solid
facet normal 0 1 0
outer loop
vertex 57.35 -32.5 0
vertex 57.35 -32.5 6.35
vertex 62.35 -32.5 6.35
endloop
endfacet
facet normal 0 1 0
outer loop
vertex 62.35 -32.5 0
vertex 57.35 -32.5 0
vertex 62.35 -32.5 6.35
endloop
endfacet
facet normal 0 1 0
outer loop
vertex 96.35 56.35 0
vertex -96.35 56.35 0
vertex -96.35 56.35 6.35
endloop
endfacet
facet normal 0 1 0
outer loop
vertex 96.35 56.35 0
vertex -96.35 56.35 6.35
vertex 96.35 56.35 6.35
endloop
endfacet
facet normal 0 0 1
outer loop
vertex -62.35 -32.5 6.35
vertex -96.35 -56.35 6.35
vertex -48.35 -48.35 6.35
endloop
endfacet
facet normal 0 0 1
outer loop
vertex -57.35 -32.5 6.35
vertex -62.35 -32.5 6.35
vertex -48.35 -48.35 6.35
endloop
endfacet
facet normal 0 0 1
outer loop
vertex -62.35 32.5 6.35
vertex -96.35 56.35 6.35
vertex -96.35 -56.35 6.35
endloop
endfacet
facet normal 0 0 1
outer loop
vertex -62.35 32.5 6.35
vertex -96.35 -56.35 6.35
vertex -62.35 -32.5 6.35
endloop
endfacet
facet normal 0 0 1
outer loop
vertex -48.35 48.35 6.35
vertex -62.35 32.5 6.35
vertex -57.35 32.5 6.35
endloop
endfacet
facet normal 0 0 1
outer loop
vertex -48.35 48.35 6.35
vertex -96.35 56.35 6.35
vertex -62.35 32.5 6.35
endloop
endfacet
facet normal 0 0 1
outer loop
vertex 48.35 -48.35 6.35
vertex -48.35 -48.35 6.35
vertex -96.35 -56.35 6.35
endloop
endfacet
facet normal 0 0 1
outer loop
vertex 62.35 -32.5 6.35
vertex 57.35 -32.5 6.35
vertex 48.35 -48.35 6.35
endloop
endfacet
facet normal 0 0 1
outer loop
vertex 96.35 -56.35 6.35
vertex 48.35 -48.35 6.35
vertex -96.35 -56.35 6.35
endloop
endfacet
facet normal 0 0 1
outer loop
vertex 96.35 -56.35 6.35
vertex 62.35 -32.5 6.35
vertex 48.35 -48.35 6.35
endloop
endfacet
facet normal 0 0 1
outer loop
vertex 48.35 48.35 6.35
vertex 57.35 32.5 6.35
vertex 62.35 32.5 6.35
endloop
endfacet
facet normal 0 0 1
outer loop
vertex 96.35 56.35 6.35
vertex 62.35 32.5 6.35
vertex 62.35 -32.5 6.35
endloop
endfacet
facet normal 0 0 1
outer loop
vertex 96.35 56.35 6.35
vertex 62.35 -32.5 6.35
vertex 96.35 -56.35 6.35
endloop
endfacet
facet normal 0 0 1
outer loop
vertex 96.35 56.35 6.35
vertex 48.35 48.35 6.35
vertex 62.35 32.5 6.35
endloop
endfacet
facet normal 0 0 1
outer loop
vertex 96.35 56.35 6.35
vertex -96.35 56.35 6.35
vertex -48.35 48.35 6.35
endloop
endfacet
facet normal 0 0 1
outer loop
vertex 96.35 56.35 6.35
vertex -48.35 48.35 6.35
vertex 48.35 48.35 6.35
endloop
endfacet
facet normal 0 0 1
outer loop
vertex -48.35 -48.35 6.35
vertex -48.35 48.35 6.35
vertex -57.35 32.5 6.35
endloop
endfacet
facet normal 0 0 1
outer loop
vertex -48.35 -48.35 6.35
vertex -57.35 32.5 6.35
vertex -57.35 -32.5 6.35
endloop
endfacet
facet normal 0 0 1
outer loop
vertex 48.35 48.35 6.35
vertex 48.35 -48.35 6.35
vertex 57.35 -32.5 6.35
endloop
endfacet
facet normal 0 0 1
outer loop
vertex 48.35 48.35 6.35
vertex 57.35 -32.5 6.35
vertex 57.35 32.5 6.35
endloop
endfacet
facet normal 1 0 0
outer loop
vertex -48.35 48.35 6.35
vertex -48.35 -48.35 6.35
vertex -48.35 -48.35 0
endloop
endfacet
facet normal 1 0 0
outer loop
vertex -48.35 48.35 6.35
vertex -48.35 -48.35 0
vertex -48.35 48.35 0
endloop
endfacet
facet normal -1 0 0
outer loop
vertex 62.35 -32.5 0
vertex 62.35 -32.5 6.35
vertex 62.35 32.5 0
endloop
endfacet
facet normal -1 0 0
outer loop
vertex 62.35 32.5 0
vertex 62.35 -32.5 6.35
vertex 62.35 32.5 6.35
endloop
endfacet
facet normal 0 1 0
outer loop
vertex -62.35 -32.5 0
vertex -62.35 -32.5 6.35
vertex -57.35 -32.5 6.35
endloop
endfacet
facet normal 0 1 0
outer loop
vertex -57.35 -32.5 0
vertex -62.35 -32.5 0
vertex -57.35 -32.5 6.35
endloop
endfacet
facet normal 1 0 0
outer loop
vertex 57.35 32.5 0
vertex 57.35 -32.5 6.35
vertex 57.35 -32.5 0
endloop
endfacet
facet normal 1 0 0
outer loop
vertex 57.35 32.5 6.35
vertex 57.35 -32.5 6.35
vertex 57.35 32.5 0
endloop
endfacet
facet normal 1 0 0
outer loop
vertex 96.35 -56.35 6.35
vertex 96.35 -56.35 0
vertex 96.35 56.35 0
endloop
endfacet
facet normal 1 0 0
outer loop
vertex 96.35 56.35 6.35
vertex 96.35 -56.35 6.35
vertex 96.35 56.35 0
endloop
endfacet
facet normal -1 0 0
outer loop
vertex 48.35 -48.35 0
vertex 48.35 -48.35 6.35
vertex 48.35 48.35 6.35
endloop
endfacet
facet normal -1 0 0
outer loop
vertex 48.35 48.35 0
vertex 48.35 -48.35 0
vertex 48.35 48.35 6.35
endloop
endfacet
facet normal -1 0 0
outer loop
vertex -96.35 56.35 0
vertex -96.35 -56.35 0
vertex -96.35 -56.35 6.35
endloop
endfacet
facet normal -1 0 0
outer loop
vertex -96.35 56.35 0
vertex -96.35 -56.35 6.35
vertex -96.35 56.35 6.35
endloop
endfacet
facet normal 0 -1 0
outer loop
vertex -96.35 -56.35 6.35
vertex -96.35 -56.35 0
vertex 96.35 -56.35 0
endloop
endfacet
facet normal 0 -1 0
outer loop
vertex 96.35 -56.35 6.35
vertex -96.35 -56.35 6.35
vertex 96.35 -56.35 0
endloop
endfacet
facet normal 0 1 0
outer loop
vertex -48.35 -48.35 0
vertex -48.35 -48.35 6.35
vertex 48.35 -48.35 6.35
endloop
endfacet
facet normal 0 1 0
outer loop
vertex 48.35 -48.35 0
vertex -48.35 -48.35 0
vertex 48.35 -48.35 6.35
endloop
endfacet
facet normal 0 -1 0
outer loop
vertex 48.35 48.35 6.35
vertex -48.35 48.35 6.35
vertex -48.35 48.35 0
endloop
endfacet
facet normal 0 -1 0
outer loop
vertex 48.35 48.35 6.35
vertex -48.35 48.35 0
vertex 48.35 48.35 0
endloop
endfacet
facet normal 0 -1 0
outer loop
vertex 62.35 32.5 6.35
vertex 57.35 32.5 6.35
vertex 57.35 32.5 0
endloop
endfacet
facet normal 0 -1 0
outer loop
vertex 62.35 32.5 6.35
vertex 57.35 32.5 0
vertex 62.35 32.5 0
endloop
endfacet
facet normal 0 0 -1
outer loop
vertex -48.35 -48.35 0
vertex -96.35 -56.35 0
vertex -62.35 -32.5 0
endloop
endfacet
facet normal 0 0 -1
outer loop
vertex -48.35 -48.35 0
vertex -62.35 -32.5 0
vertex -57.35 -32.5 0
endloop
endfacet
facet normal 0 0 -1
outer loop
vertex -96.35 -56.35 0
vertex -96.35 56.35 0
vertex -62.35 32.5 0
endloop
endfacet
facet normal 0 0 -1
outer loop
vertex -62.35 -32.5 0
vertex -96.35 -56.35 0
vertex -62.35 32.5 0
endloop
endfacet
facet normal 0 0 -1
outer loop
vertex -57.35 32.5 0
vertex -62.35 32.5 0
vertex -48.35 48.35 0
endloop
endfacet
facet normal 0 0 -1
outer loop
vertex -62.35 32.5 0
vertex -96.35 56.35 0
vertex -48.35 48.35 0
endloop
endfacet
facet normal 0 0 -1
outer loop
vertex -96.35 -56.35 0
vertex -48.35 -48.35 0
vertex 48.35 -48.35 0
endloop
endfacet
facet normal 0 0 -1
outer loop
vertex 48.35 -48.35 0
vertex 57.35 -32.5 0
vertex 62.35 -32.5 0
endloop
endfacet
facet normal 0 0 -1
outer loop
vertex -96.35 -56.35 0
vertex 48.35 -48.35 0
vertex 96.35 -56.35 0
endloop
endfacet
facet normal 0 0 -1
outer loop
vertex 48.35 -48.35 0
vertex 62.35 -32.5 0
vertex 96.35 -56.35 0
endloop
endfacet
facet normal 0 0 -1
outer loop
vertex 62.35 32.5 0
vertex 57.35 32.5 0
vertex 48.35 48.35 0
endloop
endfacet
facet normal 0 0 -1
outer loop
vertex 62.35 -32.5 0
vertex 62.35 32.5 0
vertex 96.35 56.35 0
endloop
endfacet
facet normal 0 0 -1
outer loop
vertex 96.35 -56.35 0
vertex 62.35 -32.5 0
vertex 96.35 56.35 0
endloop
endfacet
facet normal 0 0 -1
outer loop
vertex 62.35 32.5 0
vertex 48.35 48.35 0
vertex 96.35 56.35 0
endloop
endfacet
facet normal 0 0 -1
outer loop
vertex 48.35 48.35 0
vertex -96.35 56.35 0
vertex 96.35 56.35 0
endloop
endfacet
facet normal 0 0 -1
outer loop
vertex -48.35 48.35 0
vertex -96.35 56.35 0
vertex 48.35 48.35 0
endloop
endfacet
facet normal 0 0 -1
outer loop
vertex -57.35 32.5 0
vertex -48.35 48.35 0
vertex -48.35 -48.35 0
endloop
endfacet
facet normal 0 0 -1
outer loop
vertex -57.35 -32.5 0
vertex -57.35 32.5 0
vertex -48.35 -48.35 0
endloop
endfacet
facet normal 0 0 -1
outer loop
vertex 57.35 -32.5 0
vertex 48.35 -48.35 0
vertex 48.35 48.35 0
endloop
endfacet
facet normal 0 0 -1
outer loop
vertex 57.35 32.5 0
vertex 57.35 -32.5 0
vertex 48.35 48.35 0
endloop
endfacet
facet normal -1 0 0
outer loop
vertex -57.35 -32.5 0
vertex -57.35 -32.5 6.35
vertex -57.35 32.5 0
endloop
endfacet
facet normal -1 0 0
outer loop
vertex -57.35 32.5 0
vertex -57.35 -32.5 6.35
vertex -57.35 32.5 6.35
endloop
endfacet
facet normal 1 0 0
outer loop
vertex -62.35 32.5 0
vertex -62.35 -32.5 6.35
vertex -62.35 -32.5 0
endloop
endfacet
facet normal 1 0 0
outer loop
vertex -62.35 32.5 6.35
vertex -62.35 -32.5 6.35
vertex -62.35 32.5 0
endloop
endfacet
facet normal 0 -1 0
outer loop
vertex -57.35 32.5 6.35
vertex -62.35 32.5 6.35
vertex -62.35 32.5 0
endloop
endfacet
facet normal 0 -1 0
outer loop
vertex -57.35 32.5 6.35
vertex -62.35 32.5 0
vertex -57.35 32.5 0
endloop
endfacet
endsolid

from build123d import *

# Parameters (mm, degrees)
F0_W     = 192.7
F0_H     = 112.7
F1_DEPTH = 6.35
F2_W     = 96.7
F2_H     = 96.7
F2_W_2   = 5
F2_H_2   = 65
F3_DEPTH = 6.351


with BuildPart() as f1:
    # F0 (on Top) → F1 (new body)
    with BuildSketch(Plane.XY):
        Rectangle(F0_W, F0_H)
    extrude(amount=F1_DEPTH)

    # F2 (on face) → F3 (cut, through all)
    with BuildSketch(Plane.XY.offset(6.35)):
        Rectangle(F2_W, F2_H)
        with Locations((-59.85, 0)):
            Rectangle(F2_W_2, F2_H_2)
        with Locations((59.85, 0)):
            Rectangle(F2_W_2, F2_H_2)
    extrude(amount=-F3_DEPTH, mode=Mode.SUBTRACT)


solid = f1.part
